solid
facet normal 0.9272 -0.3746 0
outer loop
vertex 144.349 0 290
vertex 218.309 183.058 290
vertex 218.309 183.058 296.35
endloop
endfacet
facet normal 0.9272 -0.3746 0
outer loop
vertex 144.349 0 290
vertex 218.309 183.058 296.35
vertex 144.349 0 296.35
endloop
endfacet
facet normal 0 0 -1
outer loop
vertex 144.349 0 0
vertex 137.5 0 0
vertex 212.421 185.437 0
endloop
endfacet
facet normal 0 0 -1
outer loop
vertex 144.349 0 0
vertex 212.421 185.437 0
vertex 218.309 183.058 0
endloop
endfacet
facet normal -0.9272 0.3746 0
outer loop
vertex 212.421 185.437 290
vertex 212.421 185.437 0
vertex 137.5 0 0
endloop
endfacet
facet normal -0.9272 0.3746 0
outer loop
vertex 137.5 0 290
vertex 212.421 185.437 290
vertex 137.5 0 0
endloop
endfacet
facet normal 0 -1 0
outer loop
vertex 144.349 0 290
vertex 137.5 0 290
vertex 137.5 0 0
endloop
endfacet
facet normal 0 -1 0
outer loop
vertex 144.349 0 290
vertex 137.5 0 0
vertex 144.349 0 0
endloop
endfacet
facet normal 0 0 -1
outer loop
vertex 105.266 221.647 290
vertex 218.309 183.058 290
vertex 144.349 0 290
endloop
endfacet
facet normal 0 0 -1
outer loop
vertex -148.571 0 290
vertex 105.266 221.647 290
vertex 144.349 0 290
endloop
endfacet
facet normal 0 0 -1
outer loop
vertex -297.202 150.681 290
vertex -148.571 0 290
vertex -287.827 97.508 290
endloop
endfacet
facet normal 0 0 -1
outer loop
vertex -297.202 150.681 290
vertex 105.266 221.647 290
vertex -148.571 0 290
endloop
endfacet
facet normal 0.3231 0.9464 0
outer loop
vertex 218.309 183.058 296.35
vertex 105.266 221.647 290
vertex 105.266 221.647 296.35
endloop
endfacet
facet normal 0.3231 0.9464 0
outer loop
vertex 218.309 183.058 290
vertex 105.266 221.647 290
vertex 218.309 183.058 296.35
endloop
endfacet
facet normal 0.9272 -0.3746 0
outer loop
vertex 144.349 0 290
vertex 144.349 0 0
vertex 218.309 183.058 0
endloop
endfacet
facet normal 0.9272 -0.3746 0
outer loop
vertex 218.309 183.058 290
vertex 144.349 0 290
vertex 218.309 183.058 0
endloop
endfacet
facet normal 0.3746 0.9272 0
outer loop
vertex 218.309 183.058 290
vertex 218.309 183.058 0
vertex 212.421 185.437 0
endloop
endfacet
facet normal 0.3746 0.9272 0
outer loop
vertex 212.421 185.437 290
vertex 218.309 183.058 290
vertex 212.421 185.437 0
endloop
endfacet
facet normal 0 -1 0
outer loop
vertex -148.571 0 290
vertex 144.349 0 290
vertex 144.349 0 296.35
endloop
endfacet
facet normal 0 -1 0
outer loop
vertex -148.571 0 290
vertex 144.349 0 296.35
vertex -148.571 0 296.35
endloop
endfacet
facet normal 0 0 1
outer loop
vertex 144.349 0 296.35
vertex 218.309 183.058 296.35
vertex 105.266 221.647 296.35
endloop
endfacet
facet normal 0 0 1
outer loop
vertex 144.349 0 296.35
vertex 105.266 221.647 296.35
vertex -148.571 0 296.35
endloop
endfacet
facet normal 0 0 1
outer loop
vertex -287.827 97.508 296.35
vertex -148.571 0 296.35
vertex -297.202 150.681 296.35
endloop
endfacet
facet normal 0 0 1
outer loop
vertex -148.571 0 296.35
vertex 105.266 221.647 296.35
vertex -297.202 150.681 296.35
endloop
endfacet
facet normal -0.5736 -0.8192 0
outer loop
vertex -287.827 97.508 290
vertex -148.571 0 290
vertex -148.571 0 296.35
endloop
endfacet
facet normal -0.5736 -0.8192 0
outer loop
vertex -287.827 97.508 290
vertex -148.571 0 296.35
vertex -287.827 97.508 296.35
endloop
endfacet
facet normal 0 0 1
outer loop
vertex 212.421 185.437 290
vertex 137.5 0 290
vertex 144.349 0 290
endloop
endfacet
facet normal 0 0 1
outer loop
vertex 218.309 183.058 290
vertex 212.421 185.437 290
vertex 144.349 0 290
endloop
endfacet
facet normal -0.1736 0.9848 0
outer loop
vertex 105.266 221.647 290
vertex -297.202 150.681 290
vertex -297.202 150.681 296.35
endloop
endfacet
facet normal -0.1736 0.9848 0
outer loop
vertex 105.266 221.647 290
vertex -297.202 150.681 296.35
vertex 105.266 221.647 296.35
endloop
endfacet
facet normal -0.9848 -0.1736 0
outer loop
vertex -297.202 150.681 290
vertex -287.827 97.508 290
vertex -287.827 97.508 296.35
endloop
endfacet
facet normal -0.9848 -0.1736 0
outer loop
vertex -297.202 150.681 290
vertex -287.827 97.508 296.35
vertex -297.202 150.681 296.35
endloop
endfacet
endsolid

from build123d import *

# Parameters (mm, degrees)
BOSS_EXTRUDE1_DEPTH = 290
BOSS_EXTRUDE2_DEPTH = 6.35


with BuildPart() as part:
    # Sketch1 → Boss-Extrude1 (new body)
    with BuildSketch(Plane.XY):
        Polygon((137.5, 0), (144.348695616, 0), (218.30893616, 183.058019045), (212.421318683, 185.436770913), align=None)
    extrude(amount=BOSS_EXTRUDE1_DEPTH)


with BuildPart() as body_2:
    # Sketch2 → Boss-Extrude2 (new body)
    with BuildSketch(Plane.XY.offset(290)):
        Polygon((-297.202483124, 150.680505869), (105.26641432, 221.646631384), (218.30893616, 183.058019045), (144.348695616, 0), (-148.570887152, 0), (-287.826734681, 97.50799418), align=None)
    extrude(amount=BOSS_EXTRUDE2_DEPTH)


solid = Compound([part.part, body_2.part])
